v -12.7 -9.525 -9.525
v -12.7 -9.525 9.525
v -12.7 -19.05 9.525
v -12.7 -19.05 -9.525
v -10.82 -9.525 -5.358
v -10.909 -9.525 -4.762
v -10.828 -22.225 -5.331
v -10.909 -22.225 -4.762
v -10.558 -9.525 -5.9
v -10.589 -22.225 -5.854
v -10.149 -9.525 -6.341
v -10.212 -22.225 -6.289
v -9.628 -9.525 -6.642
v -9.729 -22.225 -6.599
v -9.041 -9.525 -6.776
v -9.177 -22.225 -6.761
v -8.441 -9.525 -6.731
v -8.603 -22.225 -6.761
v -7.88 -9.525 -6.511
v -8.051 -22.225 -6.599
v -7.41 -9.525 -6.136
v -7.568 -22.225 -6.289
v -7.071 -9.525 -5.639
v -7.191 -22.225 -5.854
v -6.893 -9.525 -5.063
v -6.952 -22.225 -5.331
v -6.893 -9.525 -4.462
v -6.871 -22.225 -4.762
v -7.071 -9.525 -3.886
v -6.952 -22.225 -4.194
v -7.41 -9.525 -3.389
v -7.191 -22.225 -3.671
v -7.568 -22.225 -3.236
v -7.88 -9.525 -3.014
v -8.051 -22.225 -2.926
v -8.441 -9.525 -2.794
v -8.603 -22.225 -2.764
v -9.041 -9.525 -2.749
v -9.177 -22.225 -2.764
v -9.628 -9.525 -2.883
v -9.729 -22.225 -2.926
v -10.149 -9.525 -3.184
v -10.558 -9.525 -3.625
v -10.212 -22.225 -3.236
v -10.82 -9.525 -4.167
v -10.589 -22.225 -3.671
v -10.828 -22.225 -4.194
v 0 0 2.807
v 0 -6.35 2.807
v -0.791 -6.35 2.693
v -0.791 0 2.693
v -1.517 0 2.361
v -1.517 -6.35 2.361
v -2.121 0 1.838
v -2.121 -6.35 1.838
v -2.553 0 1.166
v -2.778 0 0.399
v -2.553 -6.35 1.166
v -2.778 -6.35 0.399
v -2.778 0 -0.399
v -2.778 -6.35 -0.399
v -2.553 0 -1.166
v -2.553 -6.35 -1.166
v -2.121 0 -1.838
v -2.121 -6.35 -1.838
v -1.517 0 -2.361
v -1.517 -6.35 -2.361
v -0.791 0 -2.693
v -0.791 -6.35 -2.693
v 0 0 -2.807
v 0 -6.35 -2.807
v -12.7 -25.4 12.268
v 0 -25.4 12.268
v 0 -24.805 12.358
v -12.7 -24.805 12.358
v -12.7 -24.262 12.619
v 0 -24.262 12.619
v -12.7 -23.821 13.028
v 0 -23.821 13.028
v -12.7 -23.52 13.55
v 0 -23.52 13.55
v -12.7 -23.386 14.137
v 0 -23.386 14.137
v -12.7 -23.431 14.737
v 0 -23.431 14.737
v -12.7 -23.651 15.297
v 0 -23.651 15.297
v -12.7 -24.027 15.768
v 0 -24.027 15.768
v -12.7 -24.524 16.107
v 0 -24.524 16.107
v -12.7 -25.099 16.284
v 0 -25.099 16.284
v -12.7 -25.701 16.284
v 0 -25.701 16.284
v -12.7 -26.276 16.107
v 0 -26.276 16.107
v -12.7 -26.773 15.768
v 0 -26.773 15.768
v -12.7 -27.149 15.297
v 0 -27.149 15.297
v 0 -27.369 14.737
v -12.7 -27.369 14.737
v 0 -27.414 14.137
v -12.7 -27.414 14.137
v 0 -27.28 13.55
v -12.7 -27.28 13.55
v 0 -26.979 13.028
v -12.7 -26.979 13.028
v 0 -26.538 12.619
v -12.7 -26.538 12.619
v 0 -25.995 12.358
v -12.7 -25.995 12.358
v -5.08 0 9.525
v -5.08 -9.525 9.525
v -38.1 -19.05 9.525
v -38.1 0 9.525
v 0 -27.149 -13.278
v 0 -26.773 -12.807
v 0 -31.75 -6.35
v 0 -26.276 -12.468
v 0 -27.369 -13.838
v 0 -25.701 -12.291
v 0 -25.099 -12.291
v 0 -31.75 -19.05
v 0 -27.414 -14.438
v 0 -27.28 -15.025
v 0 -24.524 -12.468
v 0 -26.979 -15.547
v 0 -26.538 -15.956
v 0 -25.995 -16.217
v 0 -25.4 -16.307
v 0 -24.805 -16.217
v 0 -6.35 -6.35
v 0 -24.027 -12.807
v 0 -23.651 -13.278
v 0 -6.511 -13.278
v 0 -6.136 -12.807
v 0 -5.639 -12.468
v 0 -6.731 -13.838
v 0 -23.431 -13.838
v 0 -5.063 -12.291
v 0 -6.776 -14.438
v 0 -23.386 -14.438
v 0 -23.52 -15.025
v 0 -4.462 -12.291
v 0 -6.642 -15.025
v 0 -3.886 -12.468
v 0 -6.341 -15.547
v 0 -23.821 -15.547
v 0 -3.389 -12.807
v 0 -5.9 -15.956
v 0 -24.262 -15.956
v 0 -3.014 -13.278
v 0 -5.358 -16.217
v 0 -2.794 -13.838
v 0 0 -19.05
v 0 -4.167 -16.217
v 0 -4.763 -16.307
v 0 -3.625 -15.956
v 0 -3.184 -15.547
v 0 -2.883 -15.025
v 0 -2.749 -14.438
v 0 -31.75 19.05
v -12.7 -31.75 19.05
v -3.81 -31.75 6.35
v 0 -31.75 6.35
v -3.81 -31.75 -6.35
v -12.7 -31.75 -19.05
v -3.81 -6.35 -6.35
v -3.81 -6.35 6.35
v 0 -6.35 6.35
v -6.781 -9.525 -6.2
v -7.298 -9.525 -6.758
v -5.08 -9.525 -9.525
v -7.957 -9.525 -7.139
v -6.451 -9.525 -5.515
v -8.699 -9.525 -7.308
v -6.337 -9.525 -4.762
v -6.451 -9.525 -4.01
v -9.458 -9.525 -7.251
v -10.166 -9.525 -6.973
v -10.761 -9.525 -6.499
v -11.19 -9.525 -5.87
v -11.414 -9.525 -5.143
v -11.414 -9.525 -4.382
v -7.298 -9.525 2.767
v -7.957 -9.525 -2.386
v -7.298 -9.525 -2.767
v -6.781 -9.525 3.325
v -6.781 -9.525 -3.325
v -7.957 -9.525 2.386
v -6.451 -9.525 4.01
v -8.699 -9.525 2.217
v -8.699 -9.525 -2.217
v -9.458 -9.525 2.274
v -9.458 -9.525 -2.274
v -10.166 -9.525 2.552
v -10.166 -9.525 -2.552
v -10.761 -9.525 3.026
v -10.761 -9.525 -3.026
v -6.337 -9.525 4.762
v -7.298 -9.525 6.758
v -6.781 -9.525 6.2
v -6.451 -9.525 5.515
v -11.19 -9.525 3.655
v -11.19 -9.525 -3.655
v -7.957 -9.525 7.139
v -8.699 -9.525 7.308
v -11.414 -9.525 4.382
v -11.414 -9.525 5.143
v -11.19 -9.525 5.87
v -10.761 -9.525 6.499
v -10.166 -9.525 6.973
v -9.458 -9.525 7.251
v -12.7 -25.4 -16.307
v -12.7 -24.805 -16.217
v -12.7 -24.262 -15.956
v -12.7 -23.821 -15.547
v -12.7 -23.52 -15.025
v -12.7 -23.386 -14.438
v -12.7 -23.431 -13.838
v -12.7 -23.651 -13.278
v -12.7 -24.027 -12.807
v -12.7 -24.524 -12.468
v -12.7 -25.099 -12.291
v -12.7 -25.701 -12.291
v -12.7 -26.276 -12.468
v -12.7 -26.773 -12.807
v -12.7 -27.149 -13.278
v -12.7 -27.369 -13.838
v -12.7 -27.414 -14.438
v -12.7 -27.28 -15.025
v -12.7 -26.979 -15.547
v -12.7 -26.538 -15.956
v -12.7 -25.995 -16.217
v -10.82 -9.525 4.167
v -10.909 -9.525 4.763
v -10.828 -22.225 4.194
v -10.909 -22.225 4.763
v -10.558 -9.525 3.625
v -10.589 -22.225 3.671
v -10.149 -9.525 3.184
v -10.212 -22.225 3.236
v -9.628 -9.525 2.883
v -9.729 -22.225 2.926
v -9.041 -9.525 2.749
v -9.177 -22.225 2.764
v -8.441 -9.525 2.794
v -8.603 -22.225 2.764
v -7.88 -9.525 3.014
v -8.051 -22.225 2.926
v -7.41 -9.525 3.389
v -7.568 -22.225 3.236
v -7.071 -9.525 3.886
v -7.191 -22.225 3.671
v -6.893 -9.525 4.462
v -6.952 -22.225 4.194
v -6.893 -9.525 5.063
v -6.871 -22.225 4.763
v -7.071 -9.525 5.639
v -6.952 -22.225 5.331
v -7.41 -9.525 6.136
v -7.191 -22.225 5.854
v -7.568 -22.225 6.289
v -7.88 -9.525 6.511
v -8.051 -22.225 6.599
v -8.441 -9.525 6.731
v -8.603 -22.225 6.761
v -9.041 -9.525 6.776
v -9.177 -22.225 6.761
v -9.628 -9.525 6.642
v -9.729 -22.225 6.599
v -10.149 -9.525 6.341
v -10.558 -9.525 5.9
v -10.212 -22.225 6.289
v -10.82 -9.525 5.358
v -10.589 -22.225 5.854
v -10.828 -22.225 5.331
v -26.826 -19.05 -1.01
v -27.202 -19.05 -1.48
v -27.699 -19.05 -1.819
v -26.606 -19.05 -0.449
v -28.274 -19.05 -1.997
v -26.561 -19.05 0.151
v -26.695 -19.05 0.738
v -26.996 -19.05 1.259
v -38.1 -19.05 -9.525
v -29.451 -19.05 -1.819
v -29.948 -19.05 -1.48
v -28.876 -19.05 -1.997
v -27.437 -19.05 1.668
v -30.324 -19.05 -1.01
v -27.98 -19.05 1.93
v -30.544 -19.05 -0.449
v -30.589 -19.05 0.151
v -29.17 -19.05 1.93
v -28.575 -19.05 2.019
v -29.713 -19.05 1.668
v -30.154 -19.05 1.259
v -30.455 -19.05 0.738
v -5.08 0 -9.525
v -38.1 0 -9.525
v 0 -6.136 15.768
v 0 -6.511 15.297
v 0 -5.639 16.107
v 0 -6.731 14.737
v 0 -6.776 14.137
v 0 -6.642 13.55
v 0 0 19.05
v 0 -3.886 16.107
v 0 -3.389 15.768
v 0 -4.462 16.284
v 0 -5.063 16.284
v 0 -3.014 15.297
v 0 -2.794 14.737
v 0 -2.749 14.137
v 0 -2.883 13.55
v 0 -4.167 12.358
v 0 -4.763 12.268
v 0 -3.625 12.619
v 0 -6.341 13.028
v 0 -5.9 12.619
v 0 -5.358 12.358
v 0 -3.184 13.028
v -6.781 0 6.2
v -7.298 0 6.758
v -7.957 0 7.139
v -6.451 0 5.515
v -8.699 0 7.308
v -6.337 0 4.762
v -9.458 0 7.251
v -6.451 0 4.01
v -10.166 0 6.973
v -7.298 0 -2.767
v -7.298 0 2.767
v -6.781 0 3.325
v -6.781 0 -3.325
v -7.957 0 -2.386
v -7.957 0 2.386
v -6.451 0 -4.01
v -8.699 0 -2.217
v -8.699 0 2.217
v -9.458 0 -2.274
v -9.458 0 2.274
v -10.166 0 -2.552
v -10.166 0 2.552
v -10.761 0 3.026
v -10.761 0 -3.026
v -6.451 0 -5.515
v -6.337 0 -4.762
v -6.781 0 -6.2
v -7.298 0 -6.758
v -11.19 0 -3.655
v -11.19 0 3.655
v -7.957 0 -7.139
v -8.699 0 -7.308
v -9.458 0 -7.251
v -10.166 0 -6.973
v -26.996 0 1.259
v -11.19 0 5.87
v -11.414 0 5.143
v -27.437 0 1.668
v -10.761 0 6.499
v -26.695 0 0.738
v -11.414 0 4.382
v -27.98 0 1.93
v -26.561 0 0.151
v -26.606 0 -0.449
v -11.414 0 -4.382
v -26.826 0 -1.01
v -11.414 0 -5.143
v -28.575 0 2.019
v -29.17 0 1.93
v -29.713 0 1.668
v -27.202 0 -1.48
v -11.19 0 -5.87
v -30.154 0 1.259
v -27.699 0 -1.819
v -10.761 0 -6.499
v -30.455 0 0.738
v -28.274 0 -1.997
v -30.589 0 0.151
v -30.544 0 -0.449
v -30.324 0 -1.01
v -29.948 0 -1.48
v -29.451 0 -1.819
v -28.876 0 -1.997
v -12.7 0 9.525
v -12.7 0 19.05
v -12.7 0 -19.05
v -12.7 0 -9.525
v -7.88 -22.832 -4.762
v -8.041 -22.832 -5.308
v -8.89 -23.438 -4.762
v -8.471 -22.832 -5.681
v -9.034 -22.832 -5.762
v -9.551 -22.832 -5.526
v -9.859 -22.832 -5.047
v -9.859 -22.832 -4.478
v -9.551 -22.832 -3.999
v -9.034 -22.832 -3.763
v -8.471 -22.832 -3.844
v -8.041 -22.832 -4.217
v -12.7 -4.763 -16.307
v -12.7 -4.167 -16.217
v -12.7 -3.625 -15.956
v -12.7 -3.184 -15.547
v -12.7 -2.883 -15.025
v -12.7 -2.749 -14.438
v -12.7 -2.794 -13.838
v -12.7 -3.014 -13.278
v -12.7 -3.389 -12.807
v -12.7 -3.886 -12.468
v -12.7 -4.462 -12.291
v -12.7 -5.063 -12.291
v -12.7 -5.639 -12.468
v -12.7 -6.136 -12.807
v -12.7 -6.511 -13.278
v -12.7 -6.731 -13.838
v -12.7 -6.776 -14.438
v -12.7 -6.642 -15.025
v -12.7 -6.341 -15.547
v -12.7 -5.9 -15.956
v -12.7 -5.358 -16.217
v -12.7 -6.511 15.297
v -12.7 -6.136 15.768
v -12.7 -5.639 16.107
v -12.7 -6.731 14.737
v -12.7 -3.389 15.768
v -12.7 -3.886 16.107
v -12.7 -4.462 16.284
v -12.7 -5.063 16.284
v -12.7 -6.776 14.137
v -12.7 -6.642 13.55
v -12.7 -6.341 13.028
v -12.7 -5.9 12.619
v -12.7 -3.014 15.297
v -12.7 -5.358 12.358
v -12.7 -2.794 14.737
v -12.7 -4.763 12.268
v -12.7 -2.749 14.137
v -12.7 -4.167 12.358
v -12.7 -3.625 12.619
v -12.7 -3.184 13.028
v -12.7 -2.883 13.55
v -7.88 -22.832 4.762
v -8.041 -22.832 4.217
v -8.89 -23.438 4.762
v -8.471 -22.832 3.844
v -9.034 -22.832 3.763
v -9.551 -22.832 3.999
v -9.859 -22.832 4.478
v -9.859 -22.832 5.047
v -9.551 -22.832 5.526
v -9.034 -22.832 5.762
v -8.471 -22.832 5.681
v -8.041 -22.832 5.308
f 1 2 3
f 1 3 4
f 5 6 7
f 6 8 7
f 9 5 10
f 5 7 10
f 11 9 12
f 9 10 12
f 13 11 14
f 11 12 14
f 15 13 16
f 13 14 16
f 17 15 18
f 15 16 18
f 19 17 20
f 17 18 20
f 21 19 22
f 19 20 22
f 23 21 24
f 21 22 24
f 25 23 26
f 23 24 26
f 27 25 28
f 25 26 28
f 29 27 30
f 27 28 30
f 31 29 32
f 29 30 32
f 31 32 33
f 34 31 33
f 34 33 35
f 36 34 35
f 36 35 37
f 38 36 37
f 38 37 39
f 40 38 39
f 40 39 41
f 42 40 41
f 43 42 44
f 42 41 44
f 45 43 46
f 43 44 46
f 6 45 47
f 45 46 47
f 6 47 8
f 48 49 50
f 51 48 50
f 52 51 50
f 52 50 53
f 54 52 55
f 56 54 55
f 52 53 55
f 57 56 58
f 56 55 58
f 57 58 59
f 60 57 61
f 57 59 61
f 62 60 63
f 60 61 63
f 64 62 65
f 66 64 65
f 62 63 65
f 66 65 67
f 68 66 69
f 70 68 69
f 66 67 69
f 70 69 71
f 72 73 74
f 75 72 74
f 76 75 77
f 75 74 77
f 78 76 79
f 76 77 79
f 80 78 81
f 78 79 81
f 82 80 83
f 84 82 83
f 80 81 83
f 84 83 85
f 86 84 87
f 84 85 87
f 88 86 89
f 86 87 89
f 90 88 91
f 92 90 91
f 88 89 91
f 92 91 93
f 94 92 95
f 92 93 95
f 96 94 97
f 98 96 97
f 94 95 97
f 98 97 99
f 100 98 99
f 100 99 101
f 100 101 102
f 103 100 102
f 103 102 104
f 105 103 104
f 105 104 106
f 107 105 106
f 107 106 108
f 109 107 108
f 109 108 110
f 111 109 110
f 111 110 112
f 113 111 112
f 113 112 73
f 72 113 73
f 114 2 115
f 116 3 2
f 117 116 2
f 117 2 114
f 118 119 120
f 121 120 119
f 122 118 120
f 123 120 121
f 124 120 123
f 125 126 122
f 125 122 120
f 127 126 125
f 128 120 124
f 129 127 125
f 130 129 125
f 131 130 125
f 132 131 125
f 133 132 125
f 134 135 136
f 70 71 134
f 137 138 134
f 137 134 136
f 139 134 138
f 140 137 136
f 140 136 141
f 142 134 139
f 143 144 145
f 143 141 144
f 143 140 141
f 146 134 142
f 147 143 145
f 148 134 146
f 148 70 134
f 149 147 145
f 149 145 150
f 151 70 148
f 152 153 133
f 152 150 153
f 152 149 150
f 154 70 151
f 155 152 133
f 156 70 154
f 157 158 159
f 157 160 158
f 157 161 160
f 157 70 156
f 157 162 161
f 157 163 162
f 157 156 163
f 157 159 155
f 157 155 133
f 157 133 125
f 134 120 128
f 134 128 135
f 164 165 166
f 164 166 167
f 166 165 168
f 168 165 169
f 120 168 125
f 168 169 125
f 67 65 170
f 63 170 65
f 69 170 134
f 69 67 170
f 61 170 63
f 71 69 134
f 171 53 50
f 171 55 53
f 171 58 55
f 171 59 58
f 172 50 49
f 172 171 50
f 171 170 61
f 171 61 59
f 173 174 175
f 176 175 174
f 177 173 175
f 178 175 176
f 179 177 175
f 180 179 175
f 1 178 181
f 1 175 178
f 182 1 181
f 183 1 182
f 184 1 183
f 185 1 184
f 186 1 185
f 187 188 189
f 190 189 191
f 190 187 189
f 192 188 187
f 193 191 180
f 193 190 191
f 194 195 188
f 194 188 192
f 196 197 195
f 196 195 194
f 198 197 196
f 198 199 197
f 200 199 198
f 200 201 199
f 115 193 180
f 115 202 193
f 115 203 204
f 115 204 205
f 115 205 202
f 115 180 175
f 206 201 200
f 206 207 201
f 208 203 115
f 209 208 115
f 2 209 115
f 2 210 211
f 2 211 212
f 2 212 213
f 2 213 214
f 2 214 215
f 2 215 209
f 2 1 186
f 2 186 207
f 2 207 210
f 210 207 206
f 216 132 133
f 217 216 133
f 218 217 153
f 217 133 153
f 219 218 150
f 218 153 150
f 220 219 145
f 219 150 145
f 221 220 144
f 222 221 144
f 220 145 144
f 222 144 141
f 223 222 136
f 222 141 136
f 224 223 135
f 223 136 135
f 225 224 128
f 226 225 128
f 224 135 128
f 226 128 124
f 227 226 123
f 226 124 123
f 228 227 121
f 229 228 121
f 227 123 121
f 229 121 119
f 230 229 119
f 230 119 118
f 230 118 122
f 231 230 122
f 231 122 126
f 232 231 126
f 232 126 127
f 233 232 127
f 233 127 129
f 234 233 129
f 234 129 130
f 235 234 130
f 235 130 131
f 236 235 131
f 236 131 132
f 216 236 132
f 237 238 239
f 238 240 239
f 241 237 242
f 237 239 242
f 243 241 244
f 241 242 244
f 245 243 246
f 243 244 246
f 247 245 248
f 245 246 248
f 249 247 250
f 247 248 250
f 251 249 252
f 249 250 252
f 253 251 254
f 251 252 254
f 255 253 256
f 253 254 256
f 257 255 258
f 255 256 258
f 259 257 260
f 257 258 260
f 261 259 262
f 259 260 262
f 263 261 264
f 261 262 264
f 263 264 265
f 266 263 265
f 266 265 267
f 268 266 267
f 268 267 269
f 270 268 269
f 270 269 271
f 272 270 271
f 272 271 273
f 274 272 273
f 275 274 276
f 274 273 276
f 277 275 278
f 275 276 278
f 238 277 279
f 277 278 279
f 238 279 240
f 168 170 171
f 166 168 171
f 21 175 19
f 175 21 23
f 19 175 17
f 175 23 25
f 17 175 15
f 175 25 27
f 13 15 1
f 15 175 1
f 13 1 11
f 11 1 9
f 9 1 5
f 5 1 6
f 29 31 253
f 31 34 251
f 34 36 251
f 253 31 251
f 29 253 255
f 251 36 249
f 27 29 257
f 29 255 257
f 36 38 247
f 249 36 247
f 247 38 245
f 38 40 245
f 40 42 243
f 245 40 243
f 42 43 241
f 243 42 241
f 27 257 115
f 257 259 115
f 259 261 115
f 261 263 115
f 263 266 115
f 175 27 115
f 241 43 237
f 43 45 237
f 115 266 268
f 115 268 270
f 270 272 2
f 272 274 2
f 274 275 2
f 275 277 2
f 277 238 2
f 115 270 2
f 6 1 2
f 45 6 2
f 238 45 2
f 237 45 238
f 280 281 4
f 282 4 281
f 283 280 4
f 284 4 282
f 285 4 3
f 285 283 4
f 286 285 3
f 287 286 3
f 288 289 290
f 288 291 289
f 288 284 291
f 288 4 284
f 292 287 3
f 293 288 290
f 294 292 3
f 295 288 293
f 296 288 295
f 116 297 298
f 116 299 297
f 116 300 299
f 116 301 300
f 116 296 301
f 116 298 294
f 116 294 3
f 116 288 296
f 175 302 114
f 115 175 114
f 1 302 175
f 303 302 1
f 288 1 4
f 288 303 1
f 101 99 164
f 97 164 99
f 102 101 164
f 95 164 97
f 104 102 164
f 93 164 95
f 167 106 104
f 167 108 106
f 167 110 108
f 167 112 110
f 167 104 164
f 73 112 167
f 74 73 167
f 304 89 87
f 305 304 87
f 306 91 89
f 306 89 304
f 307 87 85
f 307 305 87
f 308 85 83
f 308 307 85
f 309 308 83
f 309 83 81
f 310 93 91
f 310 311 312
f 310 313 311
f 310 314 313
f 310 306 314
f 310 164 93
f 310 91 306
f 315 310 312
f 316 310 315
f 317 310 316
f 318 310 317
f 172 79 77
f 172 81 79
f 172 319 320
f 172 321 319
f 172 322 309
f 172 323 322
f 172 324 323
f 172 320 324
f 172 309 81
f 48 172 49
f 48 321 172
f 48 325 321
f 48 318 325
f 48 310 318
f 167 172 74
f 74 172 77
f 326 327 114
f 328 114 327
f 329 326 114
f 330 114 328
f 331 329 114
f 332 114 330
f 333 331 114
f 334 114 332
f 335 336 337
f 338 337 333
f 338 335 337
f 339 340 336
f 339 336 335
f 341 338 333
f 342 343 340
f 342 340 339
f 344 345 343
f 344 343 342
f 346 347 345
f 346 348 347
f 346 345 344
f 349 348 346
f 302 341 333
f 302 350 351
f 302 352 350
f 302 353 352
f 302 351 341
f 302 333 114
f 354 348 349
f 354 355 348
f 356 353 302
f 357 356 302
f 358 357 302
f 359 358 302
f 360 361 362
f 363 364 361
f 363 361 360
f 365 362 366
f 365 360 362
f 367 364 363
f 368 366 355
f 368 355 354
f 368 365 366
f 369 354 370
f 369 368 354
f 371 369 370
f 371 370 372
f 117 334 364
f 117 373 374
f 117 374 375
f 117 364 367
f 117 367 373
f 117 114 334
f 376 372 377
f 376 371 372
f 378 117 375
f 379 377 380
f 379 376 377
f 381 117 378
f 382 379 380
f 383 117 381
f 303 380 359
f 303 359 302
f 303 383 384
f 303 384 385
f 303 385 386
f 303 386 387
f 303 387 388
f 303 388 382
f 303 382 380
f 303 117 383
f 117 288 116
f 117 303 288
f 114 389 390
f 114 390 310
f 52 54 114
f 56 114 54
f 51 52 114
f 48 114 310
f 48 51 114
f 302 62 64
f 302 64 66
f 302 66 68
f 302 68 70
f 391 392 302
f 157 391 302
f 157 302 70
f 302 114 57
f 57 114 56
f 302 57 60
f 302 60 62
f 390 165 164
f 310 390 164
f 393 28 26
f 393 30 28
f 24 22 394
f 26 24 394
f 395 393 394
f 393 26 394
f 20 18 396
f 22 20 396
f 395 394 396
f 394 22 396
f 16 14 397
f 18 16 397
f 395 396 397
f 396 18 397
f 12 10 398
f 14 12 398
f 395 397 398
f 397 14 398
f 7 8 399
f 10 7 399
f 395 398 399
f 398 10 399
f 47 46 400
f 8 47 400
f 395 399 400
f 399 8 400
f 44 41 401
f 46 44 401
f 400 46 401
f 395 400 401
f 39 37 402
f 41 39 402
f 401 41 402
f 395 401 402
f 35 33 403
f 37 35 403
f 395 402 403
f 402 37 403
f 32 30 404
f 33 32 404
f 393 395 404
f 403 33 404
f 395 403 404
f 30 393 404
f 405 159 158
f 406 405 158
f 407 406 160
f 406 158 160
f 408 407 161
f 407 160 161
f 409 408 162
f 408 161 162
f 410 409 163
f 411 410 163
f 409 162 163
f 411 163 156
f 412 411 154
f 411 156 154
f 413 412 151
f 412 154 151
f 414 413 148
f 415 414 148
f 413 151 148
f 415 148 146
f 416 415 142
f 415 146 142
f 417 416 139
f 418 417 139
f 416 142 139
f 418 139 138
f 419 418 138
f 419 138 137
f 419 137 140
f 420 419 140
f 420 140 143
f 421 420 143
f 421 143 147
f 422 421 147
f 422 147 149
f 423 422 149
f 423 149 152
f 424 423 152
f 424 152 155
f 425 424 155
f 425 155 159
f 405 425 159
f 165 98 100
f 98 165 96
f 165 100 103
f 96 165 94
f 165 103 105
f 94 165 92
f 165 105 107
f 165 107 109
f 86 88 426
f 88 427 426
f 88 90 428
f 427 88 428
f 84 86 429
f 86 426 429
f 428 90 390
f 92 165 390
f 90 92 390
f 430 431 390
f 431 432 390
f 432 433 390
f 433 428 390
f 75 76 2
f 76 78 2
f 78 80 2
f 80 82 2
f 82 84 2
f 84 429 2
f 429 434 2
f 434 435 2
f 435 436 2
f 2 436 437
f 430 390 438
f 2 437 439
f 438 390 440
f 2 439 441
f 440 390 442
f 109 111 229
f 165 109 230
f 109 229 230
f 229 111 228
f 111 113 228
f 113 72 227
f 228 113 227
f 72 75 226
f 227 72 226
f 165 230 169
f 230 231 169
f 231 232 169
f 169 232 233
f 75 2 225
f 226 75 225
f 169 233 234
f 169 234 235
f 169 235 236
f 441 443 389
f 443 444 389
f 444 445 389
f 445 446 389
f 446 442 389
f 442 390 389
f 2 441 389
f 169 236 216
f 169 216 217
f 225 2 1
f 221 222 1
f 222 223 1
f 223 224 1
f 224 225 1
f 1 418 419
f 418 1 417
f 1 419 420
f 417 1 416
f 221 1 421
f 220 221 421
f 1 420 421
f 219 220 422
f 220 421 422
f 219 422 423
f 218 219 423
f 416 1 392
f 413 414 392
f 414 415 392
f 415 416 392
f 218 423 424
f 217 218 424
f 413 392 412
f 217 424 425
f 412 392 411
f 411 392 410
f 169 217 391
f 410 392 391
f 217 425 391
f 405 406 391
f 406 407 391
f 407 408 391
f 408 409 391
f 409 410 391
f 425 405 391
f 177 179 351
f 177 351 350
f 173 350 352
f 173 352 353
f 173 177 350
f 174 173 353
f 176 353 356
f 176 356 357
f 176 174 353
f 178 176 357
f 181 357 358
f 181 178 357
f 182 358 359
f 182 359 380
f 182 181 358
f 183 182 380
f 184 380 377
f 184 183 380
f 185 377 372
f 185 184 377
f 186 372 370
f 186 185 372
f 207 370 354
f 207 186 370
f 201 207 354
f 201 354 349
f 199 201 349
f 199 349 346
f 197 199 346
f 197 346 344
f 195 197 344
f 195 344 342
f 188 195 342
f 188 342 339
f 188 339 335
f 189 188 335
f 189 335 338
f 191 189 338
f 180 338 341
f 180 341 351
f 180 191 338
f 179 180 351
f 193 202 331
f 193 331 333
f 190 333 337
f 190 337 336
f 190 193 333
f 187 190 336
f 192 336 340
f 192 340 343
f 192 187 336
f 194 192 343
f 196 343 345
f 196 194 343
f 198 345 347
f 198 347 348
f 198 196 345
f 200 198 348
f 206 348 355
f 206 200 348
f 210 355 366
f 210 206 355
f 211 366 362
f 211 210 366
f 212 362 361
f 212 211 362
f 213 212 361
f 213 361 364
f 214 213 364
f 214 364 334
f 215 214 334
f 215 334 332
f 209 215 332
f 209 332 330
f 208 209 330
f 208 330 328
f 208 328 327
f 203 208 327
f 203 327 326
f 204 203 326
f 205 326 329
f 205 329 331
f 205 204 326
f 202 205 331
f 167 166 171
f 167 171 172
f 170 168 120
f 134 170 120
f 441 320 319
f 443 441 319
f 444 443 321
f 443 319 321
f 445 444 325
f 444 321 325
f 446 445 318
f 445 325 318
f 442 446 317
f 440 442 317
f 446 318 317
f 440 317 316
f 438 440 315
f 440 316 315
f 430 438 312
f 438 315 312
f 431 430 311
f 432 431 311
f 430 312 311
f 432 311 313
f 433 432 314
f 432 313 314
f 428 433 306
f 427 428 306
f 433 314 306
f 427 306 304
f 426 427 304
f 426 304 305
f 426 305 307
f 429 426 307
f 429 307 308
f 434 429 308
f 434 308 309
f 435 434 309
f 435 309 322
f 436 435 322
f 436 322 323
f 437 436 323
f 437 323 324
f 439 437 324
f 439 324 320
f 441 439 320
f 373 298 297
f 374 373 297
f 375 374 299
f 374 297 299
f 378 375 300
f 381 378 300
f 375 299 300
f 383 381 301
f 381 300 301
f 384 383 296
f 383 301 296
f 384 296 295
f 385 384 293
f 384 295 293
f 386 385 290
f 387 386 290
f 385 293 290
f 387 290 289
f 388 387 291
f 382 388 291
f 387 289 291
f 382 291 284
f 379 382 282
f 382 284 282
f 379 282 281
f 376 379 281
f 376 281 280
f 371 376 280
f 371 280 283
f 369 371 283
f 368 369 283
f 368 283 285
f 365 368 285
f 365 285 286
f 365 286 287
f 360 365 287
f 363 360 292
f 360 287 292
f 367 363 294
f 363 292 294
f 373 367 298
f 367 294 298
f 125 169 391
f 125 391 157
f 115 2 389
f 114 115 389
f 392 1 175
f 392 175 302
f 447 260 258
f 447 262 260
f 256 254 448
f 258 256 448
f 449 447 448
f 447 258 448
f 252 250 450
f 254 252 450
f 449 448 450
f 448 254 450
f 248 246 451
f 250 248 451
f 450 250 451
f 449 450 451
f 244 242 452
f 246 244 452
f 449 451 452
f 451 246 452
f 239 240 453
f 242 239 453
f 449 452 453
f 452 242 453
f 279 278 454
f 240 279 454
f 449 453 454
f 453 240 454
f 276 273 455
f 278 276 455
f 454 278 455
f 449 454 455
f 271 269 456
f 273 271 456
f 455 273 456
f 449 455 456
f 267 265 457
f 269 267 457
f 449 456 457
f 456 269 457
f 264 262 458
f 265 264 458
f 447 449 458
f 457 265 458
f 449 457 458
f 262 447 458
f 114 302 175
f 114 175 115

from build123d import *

# Parameters (mm, degrees)
SKETCH2_W                          = 12.7
SKETCH2_H                          = 38.1
BOSS_EXTRUDE1_DEPTH                = 31.75
SKETCH8_W                          = 3.81
SKETCH8_H                          = 12.7
CUT_EXTRUDE2_DEPTH                 = 25.4
F_10_CLEARANCE_HOLE2_D             = 5.6134
F_10_32_TAPPED_HOLE1_D             = 4.0386
SKETCH11_W                         = 19.05
SKETCH11_H                         = 9.525
CUT_EXTRUDE3_DEPTH                 = 7.62
F_10_32_TAPPED_HOLE4_D             = 4.0386
F_10_32_TAPPED_HOLE4_DEPTH         = 12.7
F_10_32_TAPPED_HOLE4_TIP           = 1.213317848
BOSS_EXTRUDE4_REACH                = 55.128
SKETCH15_W                         = 2.0193
SKETCH15_H                         = 31.75
F_10_START                         = -19.05
F_10_CLEARANCE_HOLE4_OUTLINE_R     = 2.0193
F_10_CLEARANCE_HOLE4_DEPTH         = 19.05
F_10_START_2                       = -9.525
F_10_CLEARANCE_HOLE4_2_OUTLINE_R   = 2.5527
F_10_CLEARANCE_HOLE4_2_OUTLINE_R_2 = 2.0193
F_10_CLEARANCE_HOLE4_2_DEPTH       = 9.525


# Read off the part's stored shape, not the designer's step: #10 Clearance Hole4
with BuildPart() as part:
    # Sketch2 → Boss-Extrude1 (new body)
    with BuildSketch(Plane(origin=(0, 0, 0), x_dir=(1, 0, 0), z_dir=(0, 1, 0))):
        with Locations((-6.35, 0)):
            Rectangle(SKETCH2_W, SKETCH2_H)
    extrude(amount=-BOSS_EXTRUDE1_DEPTH)

    # Sketch8 → Cut-Extrude2 (cut)
    with BuildSketch(Plane.XZ.offset(31.75)):
        with Locations((-1.905, 0)):
            Rectangle(SKETCH8_W, SKETCH8_H)
    extrude(amount=-CUT_EXTRUDE2_DEPTH, mode=Mode.SUBTRACT)

    # #10 Clearance Hole2 (through all)
    with Locations(Plane(origin=(0, 0, 0), x_dir=(1, 0, 0), z_dir=(0, 1, 0))):
        with Locations((0, 0)):
            Hole(F_10_CLEARANCE_HOLE2_D / 2)

    # #10-32 Tapped Hole1 (through all)
    with Locations(Plane.ZY.offset(12.7)):
        with Locations((14.2875, -4.7625), (14.2875, -25.4), (-14.2875, -25.4), (-14.2875, -4.7625)):
            Hole(F_10_32_TAPPED_HOLE1_D / 2)

    # Sketch11 → Cut-Extrude3 (cut)
    with BuildSketch(Plane.ZY.offset(12.7)):
        with Locations((0, -4.7625)):
            Rectangle(SKETCH11_W, SKETCH11_H)
    extrude(amount=-CUT_EXTRUDE3_DEPTH, mode=Mode.SUBTRACT)

    # #10-32 Tapped Hole4
    with Locations(Plane(origin=(0, -9.525, 0), x_dir=(1, 0, 0), z_dir=(0, 1, 0))):
        with Locations((-8.89, 4.7625), (-8.89, -4.7625)):
            Hole(F_10_32_TAPPED_HOLE4_D / 2, depth=F_10_32_TAPPED_HOLE4_DEPTH)
            with Locations((0, 0, -(F_10_32_TAPPED_HOLE4_DEPTH + F_10_32_TAPPED_HOLE4_TIP / 2))):  # 118° drill point
                Cone(0, F_10_32_TAPPED_HOLE4_D / 2, F_10_32_TAPPED_HOLE4_TIP, mode=Mode.SUBTRACT)


with BuildPart() as body_2:

    # Sketch20 → Boss-Extrude4 (new, up to next)
    with BuildSketch(Plane.ZY.offset(38.1), mode=Mode.PRIVATE) as boss_extrude4_sk1:
        Polygon((-9.525, -9.525), (-9.525, -19.05), (9.525, -19.05), (9.525, -9.525), (9.525, 0), (-9.525, 0), align=None)
    boss_extrude4_tool1 = extrude(boss_extrude4_sk1.sketch, amount=-BOSS_EXTRUDE4_REACH, mode=Mode.PRIVATE) - part.part
    add(boss_extrude4_tool1.solids().sort_by_distance((-38.1, -9.525, 0))[0])

    # Sketch15 → #10-32 Tapped Hole2 (revolve, cut)
    with BuildSketch(Plane(origin=(-28.575, 0, 0), x_dir=(0, 0, 1), z_dir=(1, 0, 0))):
        with Locations((1.00965, 15.875)):
            Rectangle(SKETCH15_W, SKETCH15_H)
    revolve(axis=Axis((-28.575, 6.35, 0), (0, -1, 0)), mode=Mode.SUBTRACT)

    # #10 Clearance Hole4 outline → #10 Clearance Hole4 (cut)
    with BuildSketch(Plane(origin=(0, 0, 0), x_dir=(1, 0, 0), z_dir=(0, 1, 0)).offset(F_10_START)):
        with Locations((-8.89, 4.7625)):
            Circle(F_10_CLEARANCE_HOLE4_OUTLINE_R)
        with Locations((-8.89, -4.7625)):
            Circle(F_10_CLEARANCE_HOLE4_OUTLINE_R)
    extrude(amount=F_10_CLEARANCE_HOLE4_DEPTH, mode=Mode.SUBTRACT)

    # 10 Clearance Hole4 2 outline → 10 Clearance Hole4 2 (cut)
    # profile 1 of 2: a face of its own
    with BuildSketch(Plane(origin=(0, 0, 0), x_dir=(1, 0, 0), z_dir=(0, 1, 0)).offset(F_10_START_2)):
        with Locations((-8.89, 4.7625)):
            Circle(F_10_CLEARANCE_HOLE4_2_OUTLINE_R)
        with Locations((-8.89, 4.7625)):
            Circle(F_10_CLEARANCE_HOLE4_2_OUTLINE_R_2, mode=Mode.SUBTRACT)
    # profile 2 of 2: a face of its own
    with BuildSketch(Plane(origin=(0, 0, 0), x_dir=(1, 0, 0), z_dir=(0, 1, 0)).offset(F_10_START_2)):
        with Locations((-8.89, -4.7625)):
            Circle(F_10_CLEARANCE_HOLE4_2_OUTLINE_R)
        with Locations((-8.89, -4.7625)):
            Circle(F_10_CLEARANCE_HOLE4_2_OUTLINE_R_2, mode=Mode.SUBTRACT)
    extrude(amount=F_10_CLEARANCE_HOLE4_2_DEPTH, mode=Mode.SUBTRACT)


solid = Compound([part.part, body_2.part])
